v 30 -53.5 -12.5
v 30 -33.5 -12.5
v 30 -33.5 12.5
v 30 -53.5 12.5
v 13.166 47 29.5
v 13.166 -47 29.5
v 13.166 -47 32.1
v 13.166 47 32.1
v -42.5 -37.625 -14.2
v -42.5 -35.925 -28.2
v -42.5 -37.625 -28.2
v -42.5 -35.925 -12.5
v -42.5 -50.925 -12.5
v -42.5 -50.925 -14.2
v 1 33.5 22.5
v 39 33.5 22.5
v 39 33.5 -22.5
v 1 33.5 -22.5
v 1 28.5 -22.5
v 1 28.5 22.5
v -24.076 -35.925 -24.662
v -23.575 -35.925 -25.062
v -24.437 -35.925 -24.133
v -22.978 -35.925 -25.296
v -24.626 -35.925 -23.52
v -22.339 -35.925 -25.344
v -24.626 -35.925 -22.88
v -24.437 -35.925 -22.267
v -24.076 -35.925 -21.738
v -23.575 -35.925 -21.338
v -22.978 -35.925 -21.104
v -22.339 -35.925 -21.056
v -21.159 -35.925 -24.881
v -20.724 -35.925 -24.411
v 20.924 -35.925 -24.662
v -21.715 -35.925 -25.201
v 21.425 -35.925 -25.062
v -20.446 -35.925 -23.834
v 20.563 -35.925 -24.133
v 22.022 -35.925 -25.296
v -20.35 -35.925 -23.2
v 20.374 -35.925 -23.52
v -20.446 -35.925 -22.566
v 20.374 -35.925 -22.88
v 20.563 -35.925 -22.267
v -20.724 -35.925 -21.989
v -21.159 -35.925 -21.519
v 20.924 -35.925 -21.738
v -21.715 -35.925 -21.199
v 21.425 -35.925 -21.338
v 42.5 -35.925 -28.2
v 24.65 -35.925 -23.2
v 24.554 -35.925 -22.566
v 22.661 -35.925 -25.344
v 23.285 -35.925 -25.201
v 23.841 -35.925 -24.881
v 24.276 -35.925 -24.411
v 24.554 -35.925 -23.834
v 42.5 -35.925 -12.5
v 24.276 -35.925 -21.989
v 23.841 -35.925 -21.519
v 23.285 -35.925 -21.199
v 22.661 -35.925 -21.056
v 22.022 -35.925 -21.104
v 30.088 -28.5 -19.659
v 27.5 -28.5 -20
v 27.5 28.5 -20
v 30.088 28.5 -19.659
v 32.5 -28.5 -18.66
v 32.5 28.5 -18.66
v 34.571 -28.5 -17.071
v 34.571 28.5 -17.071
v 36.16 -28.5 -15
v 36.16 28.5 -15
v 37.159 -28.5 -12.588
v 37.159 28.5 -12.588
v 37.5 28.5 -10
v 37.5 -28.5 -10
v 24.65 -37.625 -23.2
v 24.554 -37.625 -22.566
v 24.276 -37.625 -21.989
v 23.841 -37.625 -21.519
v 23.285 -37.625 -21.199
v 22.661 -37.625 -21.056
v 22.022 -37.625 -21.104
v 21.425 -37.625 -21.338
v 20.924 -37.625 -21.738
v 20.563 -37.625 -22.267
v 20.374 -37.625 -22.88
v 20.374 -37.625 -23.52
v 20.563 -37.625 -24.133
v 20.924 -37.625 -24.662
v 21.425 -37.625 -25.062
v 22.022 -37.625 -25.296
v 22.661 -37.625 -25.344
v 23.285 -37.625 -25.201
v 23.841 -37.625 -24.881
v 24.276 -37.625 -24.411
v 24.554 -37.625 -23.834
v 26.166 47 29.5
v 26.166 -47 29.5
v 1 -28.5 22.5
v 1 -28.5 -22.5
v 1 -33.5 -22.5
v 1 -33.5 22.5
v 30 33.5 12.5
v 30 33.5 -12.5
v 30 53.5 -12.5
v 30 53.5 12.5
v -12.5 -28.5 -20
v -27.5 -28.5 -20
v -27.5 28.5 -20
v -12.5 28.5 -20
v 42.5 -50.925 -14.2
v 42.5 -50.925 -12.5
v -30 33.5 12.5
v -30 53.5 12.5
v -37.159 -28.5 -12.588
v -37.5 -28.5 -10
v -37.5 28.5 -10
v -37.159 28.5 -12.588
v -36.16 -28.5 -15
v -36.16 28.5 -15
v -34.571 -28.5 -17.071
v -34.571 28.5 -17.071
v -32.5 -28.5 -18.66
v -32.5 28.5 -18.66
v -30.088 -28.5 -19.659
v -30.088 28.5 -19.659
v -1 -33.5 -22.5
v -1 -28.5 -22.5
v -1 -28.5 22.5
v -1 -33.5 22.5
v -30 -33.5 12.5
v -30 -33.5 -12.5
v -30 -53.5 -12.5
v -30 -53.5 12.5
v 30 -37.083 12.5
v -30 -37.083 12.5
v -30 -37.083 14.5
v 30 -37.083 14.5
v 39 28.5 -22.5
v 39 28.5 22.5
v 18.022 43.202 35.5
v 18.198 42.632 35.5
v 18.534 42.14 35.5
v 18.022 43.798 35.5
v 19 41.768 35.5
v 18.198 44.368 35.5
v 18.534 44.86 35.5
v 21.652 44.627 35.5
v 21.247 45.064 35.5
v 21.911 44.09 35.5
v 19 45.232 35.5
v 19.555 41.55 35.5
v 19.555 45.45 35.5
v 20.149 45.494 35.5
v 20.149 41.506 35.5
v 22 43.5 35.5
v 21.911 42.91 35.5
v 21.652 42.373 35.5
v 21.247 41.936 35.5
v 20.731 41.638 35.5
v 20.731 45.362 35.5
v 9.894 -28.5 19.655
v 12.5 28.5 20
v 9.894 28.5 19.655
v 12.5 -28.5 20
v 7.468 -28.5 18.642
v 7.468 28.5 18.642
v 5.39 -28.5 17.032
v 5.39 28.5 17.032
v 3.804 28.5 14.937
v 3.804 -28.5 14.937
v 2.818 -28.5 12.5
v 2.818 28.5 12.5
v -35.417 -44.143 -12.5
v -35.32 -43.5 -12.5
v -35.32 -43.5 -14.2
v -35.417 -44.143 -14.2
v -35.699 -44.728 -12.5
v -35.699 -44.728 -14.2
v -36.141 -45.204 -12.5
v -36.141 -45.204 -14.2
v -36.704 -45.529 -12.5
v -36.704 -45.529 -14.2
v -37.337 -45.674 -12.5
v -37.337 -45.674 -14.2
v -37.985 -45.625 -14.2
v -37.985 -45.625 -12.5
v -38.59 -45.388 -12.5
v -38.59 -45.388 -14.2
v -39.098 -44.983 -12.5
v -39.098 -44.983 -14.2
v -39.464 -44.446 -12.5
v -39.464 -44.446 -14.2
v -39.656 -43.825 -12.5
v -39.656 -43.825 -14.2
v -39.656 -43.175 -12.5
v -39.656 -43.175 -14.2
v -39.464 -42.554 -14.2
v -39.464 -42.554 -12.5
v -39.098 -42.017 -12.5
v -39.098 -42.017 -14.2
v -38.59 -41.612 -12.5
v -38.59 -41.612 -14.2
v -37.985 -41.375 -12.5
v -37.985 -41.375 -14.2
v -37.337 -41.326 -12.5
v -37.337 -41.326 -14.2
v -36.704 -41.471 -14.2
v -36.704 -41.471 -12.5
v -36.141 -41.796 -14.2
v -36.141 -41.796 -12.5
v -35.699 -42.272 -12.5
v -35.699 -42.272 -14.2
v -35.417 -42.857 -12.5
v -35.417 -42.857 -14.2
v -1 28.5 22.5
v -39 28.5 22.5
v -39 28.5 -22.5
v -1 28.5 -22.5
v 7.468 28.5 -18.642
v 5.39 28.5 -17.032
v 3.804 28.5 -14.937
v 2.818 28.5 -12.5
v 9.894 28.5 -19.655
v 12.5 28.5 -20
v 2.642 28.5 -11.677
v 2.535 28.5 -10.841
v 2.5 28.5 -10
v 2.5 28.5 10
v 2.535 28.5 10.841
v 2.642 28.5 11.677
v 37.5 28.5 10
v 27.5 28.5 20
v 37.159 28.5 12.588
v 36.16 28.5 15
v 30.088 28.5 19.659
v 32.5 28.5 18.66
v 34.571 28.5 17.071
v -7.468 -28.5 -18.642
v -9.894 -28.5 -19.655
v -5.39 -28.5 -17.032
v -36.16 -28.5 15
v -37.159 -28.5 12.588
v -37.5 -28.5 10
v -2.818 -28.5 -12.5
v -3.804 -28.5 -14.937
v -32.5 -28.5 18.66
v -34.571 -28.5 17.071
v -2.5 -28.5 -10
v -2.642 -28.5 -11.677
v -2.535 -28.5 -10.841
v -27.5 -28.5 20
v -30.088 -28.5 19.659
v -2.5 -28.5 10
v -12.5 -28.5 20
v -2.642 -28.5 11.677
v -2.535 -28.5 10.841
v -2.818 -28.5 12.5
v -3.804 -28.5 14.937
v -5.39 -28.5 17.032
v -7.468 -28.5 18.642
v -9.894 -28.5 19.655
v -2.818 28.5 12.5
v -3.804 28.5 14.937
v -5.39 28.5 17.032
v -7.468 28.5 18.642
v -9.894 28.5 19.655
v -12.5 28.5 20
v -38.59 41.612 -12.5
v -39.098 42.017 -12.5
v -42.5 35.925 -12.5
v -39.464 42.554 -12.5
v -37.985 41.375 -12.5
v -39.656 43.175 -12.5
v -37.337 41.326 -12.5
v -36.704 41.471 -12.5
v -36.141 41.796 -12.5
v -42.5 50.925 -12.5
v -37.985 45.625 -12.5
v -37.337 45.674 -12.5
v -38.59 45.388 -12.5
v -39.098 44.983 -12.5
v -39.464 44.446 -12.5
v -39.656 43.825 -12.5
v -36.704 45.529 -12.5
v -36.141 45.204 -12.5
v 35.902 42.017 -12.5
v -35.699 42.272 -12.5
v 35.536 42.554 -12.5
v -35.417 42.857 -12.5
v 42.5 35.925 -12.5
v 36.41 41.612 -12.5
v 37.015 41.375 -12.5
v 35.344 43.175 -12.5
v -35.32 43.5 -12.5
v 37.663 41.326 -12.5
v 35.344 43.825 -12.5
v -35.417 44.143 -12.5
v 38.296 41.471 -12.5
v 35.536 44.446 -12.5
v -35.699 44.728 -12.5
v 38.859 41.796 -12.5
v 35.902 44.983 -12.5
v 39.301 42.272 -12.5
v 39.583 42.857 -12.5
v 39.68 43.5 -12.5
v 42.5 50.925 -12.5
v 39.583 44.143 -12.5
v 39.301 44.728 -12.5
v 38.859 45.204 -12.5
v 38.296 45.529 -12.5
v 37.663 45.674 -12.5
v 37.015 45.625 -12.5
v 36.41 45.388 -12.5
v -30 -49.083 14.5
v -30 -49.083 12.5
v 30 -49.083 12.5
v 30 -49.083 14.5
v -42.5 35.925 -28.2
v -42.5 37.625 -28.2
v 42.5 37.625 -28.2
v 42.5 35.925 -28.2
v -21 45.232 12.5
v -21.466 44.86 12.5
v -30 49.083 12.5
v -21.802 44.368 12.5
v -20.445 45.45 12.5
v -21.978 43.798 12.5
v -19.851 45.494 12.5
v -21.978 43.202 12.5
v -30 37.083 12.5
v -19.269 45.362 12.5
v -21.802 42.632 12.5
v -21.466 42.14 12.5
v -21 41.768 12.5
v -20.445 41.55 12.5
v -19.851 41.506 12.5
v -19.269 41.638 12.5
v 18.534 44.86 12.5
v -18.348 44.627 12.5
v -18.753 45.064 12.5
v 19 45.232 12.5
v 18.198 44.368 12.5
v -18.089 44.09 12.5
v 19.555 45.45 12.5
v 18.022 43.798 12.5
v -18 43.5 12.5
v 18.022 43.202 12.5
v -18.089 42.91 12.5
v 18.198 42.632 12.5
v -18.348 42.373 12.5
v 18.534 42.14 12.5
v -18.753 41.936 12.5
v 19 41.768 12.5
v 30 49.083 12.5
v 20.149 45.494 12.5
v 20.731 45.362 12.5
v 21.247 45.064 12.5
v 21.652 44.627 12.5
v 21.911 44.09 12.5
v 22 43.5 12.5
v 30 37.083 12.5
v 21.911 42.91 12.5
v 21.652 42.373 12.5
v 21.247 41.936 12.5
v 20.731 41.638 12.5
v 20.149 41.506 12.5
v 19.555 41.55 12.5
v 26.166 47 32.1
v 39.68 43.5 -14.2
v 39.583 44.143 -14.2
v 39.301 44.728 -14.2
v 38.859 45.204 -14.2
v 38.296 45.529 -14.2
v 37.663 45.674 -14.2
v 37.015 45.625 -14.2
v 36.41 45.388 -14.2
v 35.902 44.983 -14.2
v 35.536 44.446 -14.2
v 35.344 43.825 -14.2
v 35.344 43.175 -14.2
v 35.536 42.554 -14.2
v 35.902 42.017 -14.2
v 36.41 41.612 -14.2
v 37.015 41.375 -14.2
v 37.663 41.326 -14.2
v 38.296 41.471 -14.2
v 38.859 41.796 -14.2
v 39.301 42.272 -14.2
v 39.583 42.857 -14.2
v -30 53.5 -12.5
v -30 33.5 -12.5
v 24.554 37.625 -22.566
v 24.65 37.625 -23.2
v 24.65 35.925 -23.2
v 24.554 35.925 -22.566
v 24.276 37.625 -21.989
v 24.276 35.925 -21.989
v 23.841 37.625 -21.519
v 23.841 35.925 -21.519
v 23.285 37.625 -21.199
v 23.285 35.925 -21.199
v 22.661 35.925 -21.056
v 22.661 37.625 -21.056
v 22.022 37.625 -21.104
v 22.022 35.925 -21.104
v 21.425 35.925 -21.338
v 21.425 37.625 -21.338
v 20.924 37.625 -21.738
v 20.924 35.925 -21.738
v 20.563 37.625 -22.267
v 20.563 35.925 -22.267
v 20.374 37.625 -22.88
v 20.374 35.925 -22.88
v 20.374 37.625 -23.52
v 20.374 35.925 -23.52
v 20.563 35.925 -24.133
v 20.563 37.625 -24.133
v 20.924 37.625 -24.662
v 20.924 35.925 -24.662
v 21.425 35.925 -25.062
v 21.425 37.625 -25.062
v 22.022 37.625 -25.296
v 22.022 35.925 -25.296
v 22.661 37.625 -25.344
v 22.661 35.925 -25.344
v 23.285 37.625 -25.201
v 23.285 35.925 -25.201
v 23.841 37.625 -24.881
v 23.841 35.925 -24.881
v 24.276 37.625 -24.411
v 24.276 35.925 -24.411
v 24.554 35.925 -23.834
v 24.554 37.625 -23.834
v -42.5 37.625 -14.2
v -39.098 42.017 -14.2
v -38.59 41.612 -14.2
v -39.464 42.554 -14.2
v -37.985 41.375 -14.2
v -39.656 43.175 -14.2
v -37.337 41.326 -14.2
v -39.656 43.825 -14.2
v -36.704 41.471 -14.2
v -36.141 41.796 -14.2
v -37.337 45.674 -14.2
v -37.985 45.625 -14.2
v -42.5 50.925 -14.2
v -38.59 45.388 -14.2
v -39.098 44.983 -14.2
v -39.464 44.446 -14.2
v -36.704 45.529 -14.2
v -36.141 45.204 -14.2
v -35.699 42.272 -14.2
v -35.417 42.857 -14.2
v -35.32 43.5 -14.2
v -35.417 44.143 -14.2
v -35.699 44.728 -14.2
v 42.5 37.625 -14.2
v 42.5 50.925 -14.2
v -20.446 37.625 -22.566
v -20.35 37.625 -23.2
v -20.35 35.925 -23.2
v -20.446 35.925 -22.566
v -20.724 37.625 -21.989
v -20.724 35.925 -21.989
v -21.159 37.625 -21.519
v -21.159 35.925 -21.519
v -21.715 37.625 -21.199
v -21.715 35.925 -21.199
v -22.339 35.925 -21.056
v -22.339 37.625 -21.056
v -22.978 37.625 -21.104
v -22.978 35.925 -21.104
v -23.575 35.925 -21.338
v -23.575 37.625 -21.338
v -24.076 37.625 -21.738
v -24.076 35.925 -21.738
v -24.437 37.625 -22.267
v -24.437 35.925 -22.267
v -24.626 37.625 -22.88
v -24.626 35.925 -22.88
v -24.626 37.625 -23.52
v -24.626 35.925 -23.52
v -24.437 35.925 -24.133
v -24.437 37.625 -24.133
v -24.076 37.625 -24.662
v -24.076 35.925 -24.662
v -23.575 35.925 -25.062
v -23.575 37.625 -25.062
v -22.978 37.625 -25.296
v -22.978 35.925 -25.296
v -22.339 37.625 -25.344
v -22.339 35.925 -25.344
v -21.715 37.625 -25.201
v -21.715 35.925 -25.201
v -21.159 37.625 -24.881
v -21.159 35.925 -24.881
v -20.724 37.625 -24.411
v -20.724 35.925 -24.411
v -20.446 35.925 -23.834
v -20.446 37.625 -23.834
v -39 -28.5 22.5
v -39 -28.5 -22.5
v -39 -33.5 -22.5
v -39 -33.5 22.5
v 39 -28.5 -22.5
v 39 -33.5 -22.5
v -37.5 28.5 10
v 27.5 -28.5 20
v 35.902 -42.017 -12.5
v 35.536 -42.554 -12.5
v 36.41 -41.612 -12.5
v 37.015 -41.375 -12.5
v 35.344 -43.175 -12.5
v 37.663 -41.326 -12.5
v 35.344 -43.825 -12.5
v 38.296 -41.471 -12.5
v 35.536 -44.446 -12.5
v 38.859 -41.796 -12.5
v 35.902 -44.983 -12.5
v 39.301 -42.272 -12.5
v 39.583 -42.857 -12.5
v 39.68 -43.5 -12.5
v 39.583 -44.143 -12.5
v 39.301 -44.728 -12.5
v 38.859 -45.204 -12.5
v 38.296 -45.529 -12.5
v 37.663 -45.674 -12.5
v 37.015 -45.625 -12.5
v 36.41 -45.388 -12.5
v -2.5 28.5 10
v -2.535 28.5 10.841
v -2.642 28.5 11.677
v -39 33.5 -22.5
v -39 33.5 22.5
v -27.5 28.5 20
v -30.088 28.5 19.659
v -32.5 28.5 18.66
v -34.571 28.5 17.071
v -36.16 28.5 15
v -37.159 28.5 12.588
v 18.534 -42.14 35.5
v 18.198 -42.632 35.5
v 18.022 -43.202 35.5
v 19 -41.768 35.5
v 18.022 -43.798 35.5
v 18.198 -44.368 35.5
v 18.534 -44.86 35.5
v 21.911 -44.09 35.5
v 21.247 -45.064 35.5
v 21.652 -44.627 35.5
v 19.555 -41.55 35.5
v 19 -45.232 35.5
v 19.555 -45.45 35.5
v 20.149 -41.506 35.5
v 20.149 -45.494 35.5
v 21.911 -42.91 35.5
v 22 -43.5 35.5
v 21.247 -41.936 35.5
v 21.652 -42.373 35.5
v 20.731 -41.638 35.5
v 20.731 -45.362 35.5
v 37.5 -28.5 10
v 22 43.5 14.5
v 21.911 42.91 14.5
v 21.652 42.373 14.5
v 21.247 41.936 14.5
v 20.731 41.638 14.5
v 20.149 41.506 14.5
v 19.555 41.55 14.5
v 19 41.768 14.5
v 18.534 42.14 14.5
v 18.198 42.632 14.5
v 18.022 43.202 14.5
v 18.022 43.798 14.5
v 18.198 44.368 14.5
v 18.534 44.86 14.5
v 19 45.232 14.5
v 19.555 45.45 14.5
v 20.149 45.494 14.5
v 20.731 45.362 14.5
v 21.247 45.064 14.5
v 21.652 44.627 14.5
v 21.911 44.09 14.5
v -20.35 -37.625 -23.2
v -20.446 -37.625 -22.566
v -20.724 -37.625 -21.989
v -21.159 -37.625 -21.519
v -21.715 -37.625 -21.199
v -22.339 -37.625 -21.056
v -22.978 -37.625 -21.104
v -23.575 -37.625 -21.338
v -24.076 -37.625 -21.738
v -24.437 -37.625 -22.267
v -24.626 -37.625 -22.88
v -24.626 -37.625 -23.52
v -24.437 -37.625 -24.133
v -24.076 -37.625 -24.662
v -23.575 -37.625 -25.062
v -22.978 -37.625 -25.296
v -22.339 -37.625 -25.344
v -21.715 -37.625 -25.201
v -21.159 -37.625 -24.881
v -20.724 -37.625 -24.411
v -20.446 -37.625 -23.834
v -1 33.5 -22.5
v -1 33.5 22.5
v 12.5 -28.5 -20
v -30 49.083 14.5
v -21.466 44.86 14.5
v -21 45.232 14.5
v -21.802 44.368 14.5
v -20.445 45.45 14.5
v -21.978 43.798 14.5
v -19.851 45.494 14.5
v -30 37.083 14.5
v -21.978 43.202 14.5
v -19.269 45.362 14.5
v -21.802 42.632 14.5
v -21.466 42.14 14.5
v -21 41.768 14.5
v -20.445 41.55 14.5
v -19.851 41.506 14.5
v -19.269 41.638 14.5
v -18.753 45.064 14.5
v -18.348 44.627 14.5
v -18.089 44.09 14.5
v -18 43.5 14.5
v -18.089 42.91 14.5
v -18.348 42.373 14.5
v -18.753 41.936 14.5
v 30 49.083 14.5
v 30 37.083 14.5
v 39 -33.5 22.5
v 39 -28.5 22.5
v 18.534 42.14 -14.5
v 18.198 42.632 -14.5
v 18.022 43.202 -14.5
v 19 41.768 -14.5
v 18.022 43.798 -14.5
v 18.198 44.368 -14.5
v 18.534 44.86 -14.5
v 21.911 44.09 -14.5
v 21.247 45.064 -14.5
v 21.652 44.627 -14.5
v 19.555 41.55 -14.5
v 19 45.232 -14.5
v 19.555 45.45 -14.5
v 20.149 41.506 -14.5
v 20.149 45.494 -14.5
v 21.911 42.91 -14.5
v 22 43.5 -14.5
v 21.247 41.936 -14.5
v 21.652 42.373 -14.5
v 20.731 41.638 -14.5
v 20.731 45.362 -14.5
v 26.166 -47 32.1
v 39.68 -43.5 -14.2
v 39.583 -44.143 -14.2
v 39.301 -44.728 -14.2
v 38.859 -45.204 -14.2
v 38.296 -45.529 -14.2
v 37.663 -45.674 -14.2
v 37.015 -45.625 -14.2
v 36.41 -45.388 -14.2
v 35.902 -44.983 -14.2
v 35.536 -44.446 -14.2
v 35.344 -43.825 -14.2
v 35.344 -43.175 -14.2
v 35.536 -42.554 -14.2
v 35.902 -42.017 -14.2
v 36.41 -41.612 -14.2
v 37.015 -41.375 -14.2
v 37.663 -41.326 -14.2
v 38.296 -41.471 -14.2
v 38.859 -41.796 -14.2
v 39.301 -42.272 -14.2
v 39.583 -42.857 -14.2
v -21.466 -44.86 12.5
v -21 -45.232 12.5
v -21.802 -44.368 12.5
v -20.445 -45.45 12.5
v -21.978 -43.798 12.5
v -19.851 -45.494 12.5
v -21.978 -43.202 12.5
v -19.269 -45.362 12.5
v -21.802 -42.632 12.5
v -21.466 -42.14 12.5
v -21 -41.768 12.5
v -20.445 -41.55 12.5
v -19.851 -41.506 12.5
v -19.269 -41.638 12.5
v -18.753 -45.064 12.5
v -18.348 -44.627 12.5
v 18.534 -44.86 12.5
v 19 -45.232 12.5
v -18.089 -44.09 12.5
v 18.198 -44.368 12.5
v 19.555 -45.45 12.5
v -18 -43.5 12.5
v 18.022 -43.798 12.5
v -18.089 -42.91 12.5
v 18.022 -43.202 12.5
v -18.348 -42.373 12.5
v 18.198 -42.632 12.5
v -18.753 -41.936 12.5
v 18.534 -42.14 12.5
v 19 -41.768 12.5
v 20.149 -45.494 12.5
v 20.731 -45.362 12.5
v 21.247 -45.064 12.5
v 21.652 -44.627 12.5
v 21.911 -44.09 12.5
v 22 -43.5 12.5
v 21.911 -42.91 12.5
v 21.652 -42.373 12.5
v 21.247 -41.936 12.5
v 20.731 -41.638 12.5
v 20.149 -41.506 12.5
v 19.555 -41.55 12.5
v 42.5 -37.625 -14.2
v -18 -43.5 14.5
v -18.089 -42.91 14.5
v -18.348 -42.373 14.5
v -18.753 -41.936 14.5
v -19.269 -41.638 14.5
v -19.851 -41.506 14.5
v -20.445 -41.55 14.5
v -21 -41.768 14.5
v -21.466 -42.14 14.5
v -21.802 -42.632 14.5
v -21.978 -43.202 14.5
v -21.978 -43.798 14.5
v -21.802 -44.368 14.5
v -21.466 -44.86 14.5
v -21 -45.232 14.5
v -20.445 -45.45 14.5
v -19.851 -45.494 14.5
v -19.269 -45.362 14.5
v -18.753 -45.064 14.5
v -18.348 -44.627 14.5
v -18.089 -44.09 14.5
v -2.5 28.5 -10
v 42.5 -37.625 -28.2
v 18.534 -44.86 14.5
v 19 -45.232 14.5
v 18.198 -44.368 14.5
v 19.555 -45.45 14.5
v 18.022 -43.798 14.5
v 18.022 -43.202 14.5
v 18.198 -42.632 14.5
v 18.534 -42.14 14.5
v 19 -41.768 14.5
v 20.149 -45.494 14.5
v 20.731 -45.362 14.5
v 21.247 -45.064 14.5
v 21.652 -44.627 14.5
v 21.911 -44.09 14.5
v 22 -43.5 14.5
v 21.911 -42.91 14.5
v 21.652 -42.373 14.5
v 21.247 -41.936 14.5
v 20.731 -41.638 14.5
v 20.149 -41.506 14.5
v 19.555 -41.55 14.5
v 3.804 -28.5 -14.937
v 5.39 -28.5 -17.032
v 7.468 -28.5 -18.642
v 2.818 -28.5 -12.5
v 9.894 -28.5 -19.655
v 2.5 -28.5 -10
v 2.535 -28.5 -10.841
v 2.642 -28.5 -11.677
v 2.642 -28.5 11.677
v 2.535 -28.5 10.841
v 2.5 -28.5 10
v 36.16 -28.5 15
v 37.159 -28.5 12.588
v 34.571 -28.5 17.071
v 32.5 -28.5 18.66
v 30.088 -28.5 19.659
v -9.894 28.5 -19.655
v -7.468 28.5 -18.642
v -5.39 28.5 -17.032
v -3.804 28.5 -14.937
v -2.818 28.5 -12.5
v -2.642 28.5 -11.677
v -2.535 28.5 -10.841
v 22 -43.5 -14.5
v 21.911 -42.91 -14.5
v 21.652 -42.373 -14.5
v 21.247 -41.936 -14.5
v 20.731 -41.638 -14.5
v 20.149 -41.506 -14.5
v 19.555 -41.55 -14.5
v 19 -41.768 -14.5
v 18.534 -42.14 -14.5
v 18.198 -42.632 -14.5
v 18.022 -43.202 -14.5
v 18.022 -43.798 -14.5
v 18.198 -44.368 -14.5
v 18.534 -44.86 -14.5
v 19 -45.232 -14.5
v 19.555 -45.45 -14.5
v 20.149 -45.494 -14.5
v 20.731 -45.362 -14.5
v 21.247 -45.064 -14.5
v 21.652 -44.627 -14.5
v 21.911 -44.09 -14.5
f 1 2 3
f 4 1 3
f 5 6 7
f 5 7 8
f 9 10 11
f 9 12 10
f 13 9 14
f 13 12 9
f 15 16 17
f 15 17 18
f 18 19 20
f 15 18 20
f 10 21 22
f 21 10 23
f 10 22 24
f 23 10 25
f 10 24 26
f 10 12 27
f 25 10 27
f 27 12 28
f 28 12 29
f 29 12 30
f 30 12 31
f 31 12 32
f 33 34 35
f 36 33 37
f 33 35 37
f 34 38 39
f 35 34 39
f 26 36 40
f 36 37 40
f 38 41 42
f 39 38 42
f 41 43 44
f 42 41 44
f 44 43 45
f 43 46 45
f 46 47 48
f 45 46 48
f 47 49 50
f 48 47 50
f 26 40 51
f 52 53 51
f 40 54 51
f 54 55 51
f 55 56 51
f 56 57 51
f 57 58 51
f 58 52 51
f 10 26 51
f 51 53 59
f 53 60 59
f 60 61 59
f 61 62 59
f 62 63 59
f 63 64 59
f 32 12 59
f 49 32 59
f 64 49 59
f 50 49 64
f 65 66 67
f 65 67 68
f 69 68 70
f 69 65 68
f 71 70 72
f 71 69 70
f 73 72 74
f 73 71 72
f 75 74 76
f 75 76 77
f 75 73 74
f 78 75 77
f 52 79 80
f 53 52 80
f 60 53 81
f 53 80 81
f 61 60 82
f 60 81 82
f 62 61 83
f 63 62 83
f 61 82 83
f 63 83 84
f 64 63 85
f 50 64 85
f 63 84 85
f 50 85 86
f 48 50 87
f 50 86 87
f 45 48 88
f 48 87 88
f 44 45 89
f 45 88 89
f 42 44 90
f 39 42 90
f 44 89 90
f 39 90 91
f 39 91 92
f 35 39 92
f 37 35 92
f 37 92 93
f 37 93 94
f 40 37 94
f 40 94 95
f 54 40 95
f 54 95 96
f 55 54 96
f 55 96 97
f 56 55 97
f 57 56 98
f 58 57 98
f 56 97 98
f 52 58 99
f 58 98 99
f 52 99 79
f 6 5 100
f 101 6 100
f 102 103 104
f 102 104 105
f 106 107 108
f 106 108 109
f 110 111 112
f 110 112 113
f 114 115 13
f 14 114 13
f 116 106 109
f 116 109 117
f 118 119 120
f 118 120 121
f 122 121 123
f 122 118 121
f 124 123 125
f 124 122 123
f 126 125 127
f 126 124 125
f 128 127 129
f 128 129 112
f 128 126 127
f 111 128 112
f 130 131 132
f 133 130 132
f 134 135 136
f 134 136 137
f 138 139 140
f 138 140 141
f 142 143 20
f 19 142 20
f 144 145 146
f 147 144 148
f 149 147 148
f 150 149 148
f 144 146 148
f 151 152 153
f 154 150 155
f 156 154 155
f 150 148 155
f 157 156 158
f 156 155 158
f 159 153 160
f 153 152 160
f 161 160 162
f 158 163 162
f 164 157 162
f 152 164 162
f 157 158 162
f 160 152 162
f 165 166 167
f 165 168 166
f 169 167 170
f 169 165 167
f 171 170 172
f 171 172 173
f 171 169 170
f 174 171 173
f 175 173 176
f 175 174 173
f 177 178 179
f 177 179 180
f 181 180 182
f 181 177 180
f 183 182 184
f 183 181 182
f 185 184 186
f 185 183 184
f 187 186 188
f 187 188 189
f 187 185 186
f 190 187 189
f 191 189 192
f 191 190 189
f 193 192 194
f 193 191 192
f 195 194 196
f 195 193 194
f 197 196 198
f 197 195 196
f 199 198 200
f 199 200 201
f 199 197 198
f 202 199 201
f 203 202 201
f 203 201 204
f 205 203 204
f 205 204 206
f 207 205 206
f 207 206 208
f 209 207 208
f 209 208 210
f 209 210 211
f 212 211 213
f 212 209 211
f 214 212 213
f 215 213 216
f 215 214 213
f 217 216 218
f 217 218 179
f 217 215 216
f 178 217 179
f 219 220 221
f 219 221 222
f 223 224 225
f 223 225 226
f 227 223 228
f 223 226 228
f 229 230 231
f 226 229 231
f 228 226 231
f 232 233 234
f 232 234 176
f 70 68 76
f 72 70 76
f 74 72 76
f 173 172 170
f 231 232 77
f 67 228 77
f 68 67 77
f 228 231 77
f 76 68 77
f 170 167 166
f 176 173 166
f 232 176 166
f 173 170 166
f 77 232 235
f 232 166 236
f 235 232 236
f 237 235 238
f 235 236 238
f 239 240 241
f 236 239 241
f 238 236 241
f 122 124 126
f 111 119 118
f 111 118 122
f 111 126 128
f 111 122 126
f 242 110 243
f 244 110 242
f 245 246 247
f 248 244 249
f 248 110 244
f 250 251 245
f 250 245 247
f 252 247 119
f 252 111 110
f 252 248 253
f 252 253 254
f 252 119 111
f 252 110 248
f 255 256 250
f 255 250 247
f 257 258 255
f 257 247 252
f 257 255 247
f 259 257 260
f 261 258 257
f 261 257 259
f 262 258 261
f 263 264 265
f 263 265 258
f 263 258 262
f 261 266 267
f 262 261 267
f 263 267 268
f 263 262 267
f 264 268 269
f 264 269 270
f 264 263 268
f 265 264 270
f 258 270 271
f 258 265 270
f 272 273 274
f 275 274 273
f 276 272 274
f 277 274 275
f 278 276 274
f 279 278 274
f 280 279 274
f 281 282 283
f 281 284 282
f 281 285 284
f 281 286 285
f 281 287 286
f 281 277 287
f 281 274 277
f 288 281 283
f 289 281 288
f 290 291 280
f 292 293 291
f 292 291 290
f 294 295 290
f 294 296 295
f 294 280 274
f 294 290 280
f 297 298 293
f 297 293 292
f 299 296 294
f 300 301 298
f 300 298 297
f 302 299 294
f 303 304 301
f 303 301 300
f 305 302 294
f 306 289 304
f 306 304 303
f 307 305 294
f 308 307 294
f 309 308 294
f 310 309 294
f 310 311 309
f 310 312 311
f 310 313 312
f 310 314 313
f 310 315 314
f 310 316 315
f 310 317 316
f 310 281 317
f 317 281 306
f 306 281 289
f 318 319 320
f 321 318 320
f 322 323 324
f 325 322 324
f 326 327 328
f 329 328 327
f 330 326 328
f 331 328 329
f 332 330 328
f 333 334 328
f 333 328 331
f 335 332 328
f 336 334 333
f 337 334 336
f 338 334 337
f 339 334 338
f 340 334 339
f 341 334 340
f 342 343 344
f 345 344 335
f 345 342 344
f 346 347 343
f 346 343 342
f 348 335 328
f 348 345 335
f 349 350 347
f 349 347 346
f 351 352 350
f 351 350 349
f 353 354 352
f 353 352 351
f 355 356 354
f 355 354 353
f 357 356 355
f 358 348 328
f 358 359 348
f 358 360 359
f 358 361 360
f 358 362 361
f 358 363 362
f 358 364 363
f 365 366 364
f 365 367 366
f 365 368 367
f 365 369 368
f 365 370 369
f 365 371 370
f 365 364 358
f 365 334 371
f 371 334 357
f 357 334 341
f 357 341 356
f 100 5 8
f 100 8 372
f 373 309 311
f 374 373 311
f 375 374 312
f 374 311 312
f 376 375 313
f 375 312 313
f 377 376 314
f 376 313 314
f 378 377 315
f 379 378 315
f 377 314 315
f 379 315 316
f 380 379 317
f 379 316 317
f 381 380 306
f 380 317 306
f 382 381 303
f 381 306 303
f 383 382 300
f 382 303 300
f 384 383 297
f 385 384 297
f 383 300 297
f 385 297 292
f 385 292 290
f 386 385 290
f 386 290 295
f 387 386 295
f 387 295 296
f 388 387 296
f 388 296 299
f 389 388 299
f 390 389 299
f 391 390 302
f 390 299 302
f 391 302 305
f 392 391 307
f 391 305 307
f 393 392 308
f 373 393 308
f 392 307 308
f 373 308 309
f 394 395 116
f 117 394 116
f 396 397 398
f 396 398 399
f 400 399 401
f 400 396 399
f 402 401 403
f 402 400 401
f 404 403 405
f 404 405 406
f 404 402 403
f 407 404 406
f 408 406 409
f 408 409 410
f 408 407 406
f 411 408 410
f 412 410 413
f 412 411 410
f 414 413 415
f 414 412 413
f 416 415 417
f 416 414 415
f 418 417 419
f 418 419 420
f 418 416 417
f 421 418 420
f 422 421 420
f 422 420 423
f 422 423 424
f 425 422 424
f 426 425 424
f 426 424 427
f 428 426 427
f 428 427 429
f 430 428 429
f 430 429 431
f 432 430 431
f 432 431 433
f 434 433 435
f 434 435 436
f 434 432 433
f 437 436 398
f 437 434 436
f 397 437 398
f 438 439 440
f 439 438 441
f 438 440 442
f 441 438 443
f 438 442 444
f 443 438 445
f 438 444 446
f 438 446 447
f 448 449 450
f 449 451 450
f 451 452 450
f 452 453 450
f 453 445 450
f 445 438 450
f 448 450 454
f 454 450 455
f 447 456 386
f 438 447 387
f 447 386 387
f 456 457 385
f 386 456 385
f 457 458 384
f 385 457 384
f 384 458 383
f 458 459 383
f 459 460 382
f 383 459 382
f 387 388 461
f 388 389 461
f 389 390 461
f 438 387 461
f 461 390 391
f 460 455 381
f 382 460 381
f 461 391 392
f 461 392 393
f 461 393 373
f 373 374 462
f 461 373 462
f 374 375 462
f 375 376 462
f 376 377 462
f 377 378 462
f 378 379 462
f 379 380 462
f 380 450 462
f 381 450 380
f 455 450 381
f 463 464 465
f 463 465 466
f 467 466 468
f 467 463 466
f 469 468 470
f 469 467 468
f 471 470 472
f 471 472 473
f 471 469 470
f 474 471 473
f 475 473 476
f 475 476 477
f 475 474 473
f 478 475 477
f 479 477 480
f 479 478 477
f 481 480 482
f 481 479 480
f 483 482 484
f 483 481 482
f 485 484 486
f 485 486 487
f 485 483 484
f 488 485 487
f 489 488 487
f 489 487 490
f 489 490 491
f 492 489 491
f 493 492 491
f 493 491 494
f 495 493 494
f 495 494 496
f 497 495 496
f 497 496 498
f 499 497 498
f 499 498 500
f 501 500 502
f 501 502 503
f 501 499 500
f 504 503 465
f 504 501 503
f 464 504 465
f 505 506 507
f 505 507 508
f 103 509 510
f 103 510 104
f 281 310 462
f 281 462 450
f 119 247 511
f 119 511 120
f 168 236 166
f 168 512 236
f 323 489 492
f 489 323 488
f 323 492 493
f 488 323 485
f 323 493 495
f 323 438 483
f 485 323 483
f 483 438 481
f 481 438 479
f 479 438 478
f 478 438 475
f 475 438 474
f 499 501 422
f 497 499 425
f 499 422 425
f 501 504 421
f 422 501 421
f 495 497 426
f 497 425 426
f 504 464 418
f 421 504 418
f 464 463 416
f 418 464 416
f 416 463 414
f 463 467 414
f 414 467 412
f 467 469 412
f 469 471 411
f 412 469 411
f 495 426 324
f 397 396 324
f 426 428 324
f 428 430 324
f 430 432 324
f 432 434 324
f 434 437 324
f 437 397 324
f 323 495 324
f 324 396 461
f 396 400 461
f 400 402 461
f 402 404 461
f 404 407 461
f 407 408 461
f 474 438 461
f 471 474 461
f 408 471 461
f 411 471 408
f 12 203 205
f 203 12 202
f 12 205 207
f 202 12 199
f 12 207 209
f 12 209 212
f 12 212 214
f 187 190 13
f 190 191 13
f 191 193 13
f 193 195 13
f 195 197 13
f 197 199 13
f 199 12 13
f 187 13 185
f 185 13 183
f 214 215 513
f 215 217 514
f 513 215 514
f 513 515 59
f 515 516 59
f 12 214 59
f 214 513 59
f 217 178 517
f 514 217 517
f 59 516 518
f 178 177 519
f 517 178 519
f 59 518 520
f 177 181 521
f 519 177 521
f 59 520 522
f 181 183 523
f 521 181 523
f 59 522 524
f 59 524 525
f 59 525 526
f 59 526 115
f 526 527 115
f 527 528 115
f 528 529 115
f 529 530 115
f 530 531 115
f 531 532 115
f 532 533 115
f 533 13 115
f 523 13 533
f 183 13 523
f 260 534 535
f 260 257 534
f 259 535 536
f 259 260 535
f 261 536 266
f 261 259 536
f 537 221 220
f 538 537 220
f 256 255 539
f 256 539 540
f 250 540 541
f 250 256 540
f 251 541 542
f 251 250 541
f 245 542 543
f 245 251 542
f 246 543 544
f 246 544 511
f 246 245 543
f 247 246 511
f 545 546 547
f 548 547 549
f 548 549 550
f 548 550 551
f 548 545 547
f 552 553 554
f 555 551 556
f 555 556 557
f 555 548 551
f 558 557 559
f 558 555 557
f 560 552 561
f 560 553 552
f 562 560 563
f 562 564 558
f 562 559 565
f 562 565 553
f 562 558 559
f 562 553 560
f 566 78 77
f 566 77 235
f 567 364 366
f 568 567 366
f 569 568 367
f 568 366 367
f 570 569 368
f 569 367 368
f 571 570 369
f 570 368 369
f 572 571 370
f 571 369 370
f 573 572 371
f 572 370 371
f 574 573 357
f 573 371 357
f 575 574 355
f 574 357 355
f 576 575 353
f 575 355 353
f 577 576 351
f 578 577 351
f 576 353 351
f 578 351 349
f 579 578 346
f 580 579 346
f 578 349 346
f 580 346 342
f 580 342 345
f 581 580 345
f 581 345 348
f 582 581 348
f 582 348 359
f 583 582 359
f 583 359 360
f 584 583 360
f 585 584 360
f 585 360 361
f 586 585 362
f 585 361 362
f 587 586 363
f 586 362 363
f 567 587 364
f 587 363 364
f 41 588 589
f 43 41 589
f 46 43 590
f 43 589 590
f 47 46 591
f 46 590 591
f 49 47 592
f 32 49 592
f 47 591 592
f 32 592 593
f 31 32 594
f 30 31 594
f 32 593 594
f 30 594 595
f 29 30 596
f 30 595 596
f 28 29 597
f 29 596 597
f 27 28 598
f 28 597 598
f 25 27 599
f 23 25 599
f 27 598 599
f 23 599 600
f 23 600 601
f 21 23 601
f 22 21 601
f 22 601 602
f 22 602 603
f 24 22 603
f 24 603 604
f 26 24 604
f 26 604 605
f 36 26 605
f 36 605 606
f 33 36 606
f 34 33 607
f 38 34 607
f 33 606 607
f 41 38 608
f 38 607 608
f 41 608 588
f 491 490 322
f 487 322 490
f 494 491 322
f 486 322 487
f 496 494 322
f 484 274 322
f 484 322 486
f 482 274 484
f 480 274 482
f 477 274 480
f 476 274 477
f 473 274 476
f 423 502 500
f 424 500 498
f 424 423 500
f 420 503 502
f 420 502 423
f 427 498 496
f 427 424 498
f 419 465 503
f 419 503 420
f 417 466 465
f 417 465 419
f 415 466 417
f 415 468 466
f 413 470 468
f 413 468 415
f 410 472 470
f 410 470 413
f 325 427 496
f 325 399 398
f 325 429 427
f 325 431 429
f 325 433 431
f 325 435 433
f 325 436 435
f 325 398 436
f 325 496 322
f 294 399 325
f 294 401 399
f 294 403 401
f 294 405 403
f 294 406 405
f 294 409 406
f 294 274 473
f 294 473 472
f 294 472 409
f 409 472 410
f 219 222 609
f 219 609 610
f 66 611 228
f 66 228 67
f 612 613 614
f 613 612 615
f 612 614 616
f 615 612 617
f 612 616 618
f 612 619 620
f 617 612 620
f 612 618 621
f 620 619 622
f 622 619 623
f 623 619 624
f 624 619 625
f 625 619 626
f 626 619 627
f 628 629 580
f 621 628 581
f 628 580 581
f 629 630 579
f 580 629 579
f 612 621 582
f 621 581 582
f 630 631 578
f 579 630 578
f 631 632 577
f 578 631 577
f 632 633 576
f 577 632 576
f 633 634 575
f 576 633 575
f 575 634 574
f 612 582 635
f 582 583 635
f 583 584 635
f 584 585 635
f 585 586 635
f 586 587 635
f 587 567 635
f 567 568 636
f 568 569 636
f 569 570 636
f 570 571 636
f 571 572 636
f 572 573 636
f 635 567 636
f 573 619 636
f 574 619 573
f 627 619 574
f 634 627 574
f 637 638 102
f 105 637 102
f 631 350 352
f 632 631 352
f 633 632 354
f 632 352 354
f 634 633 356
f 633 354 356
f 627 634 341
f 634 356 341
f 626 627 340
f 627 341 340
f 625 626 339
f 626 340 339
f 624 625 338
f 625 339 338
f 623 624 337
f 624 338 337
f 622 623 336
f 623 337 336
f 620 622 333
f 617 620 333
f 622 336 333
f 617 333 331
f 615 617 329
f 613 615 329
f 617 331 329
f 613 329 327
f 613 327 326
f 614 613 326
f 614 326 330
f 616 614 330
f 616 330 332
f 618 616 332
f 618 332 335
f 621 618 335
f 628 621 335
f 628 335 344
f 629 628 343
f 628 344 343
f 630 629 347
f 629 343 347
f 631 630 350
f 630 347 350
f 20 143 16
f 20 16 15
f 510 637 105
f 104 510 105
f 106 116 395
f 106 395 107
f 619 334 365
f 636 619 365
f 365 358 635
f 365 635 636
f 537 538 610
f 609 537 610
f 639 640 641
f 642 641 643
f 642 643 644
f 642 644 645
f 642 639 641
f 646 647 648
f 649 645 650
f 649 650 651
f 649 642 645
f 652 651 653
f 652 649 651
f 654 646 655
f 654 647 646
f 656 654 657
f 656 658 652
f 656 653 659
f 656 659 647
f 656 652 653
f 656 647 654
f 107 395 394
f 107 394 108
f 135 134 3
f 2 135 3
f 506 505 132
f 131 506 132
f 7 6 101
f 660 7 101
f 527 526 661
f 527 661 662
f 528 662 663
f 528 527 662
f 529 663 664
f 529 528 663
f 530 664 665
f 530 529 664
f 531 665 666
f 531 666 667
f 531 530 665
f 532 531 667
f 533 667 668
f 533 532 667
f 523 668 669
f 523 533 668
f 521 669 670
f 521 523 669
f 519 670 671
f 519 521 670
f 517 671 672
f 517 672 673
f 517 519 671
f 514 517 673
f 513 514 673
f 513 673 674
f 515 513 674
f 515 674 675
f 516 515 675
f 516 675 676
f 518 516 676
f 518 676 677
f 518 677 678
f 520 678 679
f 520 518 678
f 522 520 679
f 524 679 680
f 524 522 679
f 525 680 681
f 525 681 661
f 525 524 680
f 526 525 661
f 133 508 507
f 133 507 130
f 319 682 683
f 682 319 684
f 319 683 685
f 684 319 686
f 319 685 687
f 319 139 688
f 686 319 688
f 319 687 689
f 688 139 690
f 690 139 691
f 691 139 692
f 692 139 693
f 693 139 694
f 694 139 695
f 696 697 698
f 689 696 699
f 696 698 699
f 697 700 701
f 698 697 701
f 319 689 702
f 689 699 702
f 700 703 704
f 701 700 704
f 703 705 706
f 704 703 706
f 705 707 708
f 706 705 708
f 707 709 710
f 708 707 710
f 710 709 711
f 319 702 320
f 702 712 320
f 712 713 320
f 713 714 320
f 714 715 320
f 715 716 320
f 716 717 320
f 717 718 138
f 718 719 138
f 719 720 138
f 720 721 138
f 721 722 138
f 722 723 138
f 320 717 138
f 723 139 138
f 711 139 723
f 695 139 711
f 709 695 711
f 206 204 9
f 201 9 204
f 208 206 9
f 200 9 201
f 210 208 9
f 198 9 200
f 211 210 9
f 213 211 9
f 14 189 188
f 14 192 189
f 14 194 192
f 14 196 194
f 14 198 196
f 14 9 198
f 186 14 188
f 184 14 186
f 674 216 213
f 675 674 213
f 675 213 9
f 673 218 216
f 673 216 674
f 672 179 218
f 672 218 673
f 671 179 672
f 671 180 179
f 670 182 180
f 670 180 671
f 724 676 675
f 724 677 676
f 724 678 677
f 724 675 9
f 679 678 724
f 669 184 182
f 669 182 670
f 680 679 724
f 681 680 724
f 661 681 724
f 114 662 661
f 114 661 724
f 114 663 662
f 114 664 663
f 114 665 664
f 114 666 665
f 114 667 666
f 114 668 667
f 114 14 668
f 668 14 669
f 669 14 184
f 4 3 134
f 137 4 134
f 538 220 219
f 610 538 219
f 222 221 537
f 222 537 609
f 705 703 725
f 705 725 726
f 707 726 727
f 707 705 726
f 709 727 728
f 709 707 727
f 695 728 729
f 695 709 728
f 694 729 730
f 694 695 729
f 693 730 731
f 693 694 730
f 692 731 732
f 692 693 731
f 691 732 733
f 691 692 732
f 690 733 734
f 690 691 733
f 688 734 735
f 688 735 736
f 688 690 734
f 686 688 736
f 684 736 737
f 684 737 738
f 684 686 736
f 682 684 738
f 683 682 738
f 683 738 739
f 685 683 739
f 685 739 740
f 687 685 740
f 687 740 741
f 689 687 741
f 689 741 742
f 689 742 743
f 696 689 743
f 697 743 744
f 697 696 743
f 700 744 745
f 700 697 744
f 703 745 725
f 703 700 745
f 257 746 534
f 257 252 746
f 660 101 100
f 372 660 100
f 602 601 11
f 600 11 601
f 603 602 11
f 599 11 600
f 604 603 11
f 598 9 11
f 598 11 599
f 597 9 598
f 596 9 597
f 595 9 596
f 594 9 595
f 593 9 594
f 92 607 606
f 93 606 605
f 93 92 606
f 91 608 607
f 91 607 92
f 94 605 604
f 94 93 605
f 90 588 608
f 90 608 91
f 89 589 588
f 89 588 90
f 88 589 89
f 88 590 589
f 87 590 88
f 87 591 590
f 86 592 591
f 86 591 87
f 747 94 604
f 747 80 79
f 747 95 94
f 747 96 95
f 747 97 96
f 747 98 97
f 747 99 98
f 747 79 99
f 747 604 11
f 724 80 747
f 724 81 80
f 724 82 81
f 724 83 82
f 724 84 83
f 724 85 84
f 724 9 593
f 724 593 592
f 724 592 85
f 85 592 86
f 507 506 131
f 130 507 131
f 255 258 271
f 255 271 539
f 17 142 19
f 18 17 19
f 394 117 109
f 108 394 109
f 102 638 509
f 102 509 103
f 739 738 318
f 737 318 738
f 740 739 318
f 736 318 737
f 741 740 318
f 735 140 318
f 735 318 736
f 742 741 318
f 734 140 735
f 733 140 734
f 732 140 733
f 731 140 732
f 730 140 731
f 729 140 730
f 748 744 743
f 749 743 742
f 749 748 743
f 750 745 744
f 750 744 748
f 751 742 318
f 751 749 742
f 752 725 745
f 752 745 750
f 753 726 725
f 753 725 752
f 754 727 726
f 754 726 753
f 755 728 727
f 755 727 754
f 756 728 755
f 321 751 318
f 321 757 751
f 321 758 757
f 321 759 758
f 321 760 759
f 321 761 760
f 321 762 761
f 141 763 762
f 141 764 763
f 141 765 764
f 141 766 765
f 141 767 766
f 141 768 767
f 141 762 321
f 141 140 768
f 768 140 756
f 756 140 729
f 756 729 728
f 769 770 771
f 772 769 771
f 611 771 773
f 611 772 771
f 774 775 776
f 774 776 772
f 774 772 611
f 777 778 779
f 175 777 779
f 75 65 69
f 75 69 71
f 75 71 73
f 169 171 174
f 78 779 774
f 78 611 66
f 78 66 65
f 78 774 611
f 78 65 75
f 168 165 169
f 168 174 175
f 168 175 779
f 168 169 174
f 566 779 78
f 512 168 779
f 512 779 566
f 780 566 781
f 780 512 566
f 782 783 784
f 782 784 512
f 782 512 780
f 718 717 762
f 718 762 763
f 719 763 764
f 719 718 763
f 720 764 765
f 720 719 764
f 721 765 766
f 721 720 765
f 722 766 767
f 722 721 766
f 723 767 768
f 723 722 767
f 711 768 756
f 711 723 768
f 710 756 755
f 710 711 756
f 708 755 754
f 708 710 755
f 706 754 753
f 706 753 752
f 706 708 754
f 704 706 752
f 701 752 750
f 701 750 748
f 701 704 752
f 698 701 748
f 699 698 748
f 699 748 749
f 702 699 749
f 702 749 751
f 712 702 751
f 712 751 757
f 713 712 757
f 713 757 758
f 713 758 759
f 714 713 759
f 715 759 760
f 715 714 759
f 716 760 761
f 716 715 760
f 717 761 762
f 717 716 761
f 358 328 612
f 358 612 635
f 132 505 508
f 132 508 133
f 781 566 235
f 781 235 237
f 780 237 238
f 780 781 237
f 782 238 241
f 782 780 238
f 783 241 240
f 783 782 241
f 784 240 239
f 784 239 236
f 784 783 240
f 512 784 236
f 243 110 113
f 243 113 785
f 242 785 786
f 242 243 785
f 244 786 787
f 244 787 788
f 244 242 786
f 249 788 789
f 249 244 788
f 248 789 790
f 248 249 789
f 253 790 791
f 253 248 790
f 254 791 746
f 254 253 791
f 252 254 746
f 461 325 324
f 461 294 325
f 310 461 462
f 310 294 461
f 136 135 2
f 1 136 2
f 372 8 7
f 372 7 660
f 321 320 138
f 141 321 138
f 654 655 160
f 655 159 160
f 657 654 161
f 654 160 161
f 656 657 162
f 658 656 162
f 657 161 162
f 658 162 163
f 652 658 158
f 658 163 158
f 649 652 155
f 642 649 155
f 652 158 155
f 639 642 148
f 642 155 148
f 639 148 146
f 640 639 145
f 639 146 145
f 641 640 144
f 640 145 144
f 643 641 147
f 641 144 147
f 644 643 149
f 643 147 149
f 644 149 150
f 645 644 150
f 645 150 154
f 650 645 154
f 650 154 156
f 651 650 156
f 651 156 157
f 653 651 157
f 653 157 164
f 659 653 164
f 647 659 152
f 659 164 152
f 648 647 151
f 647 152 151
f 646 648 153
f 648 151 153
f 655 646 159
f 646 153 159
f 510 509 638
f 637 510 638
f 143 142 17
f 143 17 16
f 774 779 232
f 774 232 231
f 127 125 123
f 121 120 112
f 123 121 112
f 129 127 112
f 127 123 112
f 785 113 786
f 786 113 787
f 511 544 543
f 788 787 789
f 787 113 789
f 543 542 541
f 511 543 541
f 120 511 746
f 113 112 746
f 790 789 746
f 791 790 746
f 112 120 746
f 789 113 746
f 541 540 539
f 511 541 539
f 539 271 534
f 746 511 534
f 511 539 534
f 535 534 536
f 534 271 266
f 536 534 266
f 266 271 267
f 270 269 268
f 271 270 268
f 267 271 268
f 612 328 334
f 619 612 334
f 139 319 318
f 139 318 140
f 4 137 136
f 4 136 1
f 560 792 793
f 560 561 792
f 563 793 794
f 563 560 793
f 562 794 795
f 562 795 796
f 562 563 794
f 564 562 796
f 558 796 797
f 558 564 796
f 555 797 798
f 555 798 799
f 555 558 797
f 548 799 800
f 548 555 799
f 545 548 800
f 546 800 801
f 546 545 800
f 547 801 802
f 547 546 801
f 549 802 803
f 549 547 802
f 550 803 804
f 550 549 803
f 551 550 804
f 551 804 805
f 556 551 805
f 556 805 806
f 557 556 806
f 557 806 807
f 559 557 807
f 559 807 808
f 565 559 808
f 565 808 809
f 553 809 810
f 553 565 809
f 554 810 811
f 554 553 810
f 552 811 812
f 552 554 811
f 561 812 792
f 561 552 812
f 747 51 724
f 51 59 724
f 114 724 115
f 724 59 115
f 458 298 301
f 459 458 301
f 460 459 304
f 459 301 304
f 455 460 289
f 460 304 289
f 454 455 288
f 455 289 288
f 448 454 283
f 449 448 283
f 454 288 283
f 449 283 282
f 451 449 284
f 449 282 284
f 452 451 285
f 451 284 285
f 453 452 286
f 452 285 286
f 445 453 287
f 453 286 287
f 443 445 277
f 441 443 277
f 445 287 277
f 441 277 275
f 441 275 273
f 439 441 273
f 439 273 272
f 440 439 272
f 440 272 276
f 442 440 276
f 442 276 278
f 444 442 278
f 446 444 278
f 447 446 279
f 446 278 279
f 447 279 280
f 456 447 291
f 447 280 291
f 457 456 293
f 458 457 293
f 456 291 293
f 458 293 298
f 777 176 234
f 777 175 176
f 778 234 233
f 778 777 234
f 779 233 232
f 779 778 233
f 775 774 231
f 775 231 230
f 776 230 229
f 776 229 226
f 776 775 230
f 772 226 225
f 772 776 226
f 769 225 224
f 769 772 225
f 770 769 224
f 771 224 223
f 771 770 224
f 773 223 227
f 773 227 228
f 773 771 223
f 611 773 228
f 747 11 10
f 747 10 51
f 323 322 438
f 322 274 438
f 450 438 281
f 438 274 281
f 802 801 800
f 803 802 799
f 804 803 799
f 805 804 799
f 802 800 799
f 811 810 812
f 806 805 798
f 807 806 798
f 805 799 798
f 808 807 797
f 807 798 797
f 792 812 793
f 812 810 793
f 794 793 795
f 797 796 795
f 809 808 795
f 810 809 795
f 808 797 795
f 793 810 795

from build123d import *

# Parameters (mm, degrees)
F0_W           = 20
F0_H           = 25
F1_DEPTH       = 28.5
F2_W           = 38
F2_H           = 45
F3_DEPTH       = 5
F6_W           = 29
F6_H           = 25
F6_W_2         = 31
F7_DEPTH       = 20
F9_W           = 60
F9_H           = 12
F9_R           = 2
F10_DEPTH      = 2
F12_W          = 12.5
F12_H          = 1.7
F12_H_2        = 13.3
F12_R          = 2.18
F12_W_2        = 60
F13_DEPTH      = 1.7
F14_W          = 85
F14_H          = 1.7
F15_DEPTH      = 14
F16_R          = 2.15
F17_DEPTH      = 1.7
F20_W          = 13
F20_H          = 94
F21_DEPTH      = 2.6
F22_DEPTH      = 23
F22_DEPTH_BACK = 27


with BuildPart() as f1:
    # F0 (on Front) → F1 (new body, symmetric)
    with BuildSketch(Plane.XZ):
        with Locations((-20, 0)):
            Rectangle(F0_W, F0_H)
        with BuildLine():
            ThreePointArc((-12.5, -20), (-6.376275643, -17.9056941504), (-2.8175416345, -12.5))
            Line((-2.8175416345, -12.5), (-10, -12.5))
            Line((-10, -12.5), (-30, -12.5))
            Line((-30, -12.5), (-30, 12.5))
            Line((-30, 12.5), (-10, 12.5))
            Line((-10, 12.5), (-2.8175416345, 12.5))
            ThreePointArc((-2.8175416345, 12.5), (-6.376275643, 17.9056941504), (-12.5, 20))
            Line((-12.5, 20), (-27.5, 20))
            ThreePointArc((-27.5, 20), (-34.5710678119, 17.0710678119), (-37.5, 10))
            Line((-37.5, 10), (-37.5, -10))
            ThreePointArc((-37.5, -10), (-34.5710678119, -17.0710678119), (-27.5, -20))
            Line((-27.5, -20), (-12.5, -20))
        make_face()
        with BuildLine():
            Line((-10, -12.5), (-2.8175416345, -12.5))
            ThreePointArc((-2.8175416345, -12.5), (-2.5797030373, -11.2600429248), (-2.5, -10))
            Line((-2.5, -10), (-2.5, 10))
            ThreePointArc((-2.5, 10), (-2.5797030373, 11.2600429248), (-2.8175416345, 12.5))
            Line((-2.8175416345, 12.5), (-10, 12.5))
            Line((-10, 12.5), (-10, -12.5))
        make_face()
    extrude(amount=F1_DEPTH, both=True)


with BuildPart() as f1b:
    # F0 (on Front) → F1, piece 2 (new body, symmetric)
    with BuildSketch(Plane.XZ):
        with Locations((20, 0)):
            Rectangle(F0_W, F0_H)
        with BuildLine():
            Line((2.8175416345, -12.5), (10, -12.5))
            Line((10, -12.5), (10, 12.5))
            Line((10, 12.5), (2.8175416345, 12.5))
            ThreePointArc((2.8175416345, 12.5), (2.5797030373, 11.2600429248), (2.5, 10))
            Line((2.5, 10), (2.5, -10))
            ThreePointArc((2.5, -10), (2.5797030373, -11.2600429248), (2.8175416345, -12.5))
        make_face()
        with BuildLine():
            Line((30, 12.5), (30, -12.5))
            Line((30, -12.5), (10, -12.5))
            Line((10, -12.5), (2.8175416345, -12.5))
            ThreePointArc((2.8175416345, -12.5), (6.376275643, -17.9056941504), (12.5, -20))
            Line((12.5, -20), (27.5, -20))
            ThreePointArc((27.5, -20), (34.5710678119, -17.0710678119), (37.5, -10))
            Line((37.5, -10), (37.5, 10))
            ThreePointArc((37.5, 10), (34.5710678119, 17.0710678119), (27.5, 20))
            Line((27.5, 20), (12.5, 20))
            ThreePointArc((12.5, 20), (6.376275643, 17.9056941504), (2.8175416345, 12.5))
            Line((2.8175416345, 12.5), (10, 12.5))
            Line((10, 12.5), (30, 12.5))
        make_face()
    extrude(amount=F1_DEPTH, both=True)


with BuildPart() as f3:
    # F2 (on face) → F3 (new body)
    with BuildSketch(Plane.XZ.offset(28.5)):
        with Locations((-20, 0)):
            Rectangle(F2_W, F2_H)
        with BuildLine():
            Line((-27.5, 20), (-12.5, 20))
            ThreePointArc((-12.5, 20), (-5.4289321881, 17.0710678119), (-2.5, 10))
            Line((-2.5, 10), (-2.5, -10))
            ThreePointArc((-2.5, -10), (-5.4289321881, -17.0710678119), (-12.5, -20))
            Line((-12.5, -20), (-27.5, -20))
            ThreePointArc((-27.5, -20), (-34.5710678119, -17.0710678119), (-37.5, -10))
            Line((-37.5, -10), (-37.5, 10))
            ThreePointArc((-37.5, 10), (-34.5710678119, 17.0710678119), (-27.5, 20))
        make_face(mode=Mode.SUBTRACT)
        with BuildLine():
            ThreePointArc((-2.5, 10), (-5.4289321881, 17.0710678119), (-12.5, 20))
            Line((-12.5, 20), (-27.5, 20))
            ThreePointArc((-27.5, 20), (-34.5710678119, 17.0710678119), (-37.5, 10))
            Line((-37.5, 10), (-37.5, -10))
            ThreePointArc((-37.5, -10), (-34.5710678119, -17.0710678119), (-27.5, -20))
            Line((-27.5, -20), (-12.5, -20))
            ThreePointArc((-12.5, -20), (-5.4289321881, -17.0710678119), (-2.5, -10))
            Line((-2.5, -10), (-2.5, 10))
        make_face()
    extrude(amount=F3_DEPTH)


with BuildPart() as f4_1:
    # F4: instance of F3
    add(f3.part.mirror(Plane.YZ))


with BuildPart() as f5_1:
    # F5: instance of F3
    add(f3.part.mirror(Plane.XZ))


with BuildPart() as f5_2:
    # F5: instance of F4_1
    add(f4_1.part.mirror(Plane.XZ))


with BuildPart() as f7:
    # F6 (on face) → F7 (new body)
    with BuildSketch(Plane.XZ.offset(33.5)):
        with Locations((-15.5, 0)):
            Rectangle(F6_W, F6_H)
        with Locations((14.5, 0)):
            Rectangle(F6_W_2, F6_H)
    extrude(amount=F7_DEPTH)


with BuildPart() as f8_1:
    # F8: instance of F7
    add(f7.part.mirror(Plane.XZ))


with BuildPart() as f10:
    # F9 (on face) → F10 (new body)
    with BuildSketch(Plane.XY.offset(12.5)):
        with Locations((0, -43.0828370154)):
            Rectangle(F9_W, F9_H)
        with Locations((-20, -43.5)):
            Circle(F9_R, mode=Mode.SUBTRACT)
        with Locations((20, -43.5)):
            Circle(F9_R, mode=Mode.SUBTRACT)
    extrude(amount=F10_DEPTH)


with BuildPart() as f11_1:
    # F11: instance of F10
    add(f10.part.mirror(Plane.XZ))


with BuildPart() as f13:
    # F12 (on face) → F13 (new body)
    with BuildSketch(Plane(origin=(0, 0, -12.5), x_dir=(1, 0, 0), z_dir=(0, 0, -1))):
        with Locations((-36.25, 36.774602598)):
            Rectangle(F12_W, F12_H)
        with Locations((-36.25, 44.274602598)):
            Rectangle(F12_W, F12_H_2)
        with Locations((-37.5, 43.5)):
            Circle(F12_R, mode=Mode.SUBTRACT)
        with Locations((36.25, 36.774602598)):
            Rectangle(F12_W, F12_H)
        with Locations((36.25, 44.274602598)):
            Rectangle(F12_W, F12_H_2)
        with Locations((37.5, 43.5)):
            Circle(F12_R, mode=Mode.SUBTRACT)
        with Locations((0, 36.774602598)):
            Rectangle(F12_W_2, F12_H)
        with Locations((0, 44.274602598)):
            Rectangle(F12_W_2, F12_H_2)
    extrude(amount=F13_DEPTH)

    # F14 (on face) → F15 (join)
    with BuildSketch(Plane(origin=(0, 0, -14.2), x_dir=(1, 0, 0), z_dir=(0, 0, -1))):
        with Locations((0, 36.774602598)):
            Rectangle(F14_W, F14_H)
    extrude(amount=F15_DEPTH)

    # F16 (on face) → F17 (cut, through all)
    with BuildSketch(Plane.XZ.offset(37.624602598)):
        with Locations((-22.5, -23.2)):
            Circle(F16_R)
        with Locations((22.5, -23.2)):
            Circle(F16_R)
    extrude(amount=-F17_DEPTH, mode=Mode.SUBTRACT)


with BuildPart() as f18_1:
    # F18: instance of F13
    add(f13.part.mirror(Plane.XZ))


with BuildPart() as f21:
    # F20 (on offset) → F21 (new body)
    with BuildSketch(Plane.XY.offset(29.5)):
        with Locations((19.6661213413, 0)):
            Rectangle(F20_W, F20_H)
    extrude(amount=F21_DEPTH)


with BuildPart() as f22:
    # F9 (on face) → F22 (new body, two sides)
    with BuildSketch(Plane.XY.offset(12.5)) as f22_sk:
        with Locations((20, -43.5)):
            Circle(F9_R)
    extrude(amount=F22_DEPTH)
    extrude(f22_sk.sketch, amount=-F22_DEPTH_BACK)


with BuildPart() as f23_1:
    # F23: instance of F22
    add(f22.part.mirror(Plane.XZ))


solid = Compound([f1.part, f1b.part, f3.part, f4_1.part, f5_1.part, f5_2.part, f7.part, f8_1.part, f10.part, f11_1.part, f13.part, f18_1.part, f21.part, f22.part, f23_1.part])
